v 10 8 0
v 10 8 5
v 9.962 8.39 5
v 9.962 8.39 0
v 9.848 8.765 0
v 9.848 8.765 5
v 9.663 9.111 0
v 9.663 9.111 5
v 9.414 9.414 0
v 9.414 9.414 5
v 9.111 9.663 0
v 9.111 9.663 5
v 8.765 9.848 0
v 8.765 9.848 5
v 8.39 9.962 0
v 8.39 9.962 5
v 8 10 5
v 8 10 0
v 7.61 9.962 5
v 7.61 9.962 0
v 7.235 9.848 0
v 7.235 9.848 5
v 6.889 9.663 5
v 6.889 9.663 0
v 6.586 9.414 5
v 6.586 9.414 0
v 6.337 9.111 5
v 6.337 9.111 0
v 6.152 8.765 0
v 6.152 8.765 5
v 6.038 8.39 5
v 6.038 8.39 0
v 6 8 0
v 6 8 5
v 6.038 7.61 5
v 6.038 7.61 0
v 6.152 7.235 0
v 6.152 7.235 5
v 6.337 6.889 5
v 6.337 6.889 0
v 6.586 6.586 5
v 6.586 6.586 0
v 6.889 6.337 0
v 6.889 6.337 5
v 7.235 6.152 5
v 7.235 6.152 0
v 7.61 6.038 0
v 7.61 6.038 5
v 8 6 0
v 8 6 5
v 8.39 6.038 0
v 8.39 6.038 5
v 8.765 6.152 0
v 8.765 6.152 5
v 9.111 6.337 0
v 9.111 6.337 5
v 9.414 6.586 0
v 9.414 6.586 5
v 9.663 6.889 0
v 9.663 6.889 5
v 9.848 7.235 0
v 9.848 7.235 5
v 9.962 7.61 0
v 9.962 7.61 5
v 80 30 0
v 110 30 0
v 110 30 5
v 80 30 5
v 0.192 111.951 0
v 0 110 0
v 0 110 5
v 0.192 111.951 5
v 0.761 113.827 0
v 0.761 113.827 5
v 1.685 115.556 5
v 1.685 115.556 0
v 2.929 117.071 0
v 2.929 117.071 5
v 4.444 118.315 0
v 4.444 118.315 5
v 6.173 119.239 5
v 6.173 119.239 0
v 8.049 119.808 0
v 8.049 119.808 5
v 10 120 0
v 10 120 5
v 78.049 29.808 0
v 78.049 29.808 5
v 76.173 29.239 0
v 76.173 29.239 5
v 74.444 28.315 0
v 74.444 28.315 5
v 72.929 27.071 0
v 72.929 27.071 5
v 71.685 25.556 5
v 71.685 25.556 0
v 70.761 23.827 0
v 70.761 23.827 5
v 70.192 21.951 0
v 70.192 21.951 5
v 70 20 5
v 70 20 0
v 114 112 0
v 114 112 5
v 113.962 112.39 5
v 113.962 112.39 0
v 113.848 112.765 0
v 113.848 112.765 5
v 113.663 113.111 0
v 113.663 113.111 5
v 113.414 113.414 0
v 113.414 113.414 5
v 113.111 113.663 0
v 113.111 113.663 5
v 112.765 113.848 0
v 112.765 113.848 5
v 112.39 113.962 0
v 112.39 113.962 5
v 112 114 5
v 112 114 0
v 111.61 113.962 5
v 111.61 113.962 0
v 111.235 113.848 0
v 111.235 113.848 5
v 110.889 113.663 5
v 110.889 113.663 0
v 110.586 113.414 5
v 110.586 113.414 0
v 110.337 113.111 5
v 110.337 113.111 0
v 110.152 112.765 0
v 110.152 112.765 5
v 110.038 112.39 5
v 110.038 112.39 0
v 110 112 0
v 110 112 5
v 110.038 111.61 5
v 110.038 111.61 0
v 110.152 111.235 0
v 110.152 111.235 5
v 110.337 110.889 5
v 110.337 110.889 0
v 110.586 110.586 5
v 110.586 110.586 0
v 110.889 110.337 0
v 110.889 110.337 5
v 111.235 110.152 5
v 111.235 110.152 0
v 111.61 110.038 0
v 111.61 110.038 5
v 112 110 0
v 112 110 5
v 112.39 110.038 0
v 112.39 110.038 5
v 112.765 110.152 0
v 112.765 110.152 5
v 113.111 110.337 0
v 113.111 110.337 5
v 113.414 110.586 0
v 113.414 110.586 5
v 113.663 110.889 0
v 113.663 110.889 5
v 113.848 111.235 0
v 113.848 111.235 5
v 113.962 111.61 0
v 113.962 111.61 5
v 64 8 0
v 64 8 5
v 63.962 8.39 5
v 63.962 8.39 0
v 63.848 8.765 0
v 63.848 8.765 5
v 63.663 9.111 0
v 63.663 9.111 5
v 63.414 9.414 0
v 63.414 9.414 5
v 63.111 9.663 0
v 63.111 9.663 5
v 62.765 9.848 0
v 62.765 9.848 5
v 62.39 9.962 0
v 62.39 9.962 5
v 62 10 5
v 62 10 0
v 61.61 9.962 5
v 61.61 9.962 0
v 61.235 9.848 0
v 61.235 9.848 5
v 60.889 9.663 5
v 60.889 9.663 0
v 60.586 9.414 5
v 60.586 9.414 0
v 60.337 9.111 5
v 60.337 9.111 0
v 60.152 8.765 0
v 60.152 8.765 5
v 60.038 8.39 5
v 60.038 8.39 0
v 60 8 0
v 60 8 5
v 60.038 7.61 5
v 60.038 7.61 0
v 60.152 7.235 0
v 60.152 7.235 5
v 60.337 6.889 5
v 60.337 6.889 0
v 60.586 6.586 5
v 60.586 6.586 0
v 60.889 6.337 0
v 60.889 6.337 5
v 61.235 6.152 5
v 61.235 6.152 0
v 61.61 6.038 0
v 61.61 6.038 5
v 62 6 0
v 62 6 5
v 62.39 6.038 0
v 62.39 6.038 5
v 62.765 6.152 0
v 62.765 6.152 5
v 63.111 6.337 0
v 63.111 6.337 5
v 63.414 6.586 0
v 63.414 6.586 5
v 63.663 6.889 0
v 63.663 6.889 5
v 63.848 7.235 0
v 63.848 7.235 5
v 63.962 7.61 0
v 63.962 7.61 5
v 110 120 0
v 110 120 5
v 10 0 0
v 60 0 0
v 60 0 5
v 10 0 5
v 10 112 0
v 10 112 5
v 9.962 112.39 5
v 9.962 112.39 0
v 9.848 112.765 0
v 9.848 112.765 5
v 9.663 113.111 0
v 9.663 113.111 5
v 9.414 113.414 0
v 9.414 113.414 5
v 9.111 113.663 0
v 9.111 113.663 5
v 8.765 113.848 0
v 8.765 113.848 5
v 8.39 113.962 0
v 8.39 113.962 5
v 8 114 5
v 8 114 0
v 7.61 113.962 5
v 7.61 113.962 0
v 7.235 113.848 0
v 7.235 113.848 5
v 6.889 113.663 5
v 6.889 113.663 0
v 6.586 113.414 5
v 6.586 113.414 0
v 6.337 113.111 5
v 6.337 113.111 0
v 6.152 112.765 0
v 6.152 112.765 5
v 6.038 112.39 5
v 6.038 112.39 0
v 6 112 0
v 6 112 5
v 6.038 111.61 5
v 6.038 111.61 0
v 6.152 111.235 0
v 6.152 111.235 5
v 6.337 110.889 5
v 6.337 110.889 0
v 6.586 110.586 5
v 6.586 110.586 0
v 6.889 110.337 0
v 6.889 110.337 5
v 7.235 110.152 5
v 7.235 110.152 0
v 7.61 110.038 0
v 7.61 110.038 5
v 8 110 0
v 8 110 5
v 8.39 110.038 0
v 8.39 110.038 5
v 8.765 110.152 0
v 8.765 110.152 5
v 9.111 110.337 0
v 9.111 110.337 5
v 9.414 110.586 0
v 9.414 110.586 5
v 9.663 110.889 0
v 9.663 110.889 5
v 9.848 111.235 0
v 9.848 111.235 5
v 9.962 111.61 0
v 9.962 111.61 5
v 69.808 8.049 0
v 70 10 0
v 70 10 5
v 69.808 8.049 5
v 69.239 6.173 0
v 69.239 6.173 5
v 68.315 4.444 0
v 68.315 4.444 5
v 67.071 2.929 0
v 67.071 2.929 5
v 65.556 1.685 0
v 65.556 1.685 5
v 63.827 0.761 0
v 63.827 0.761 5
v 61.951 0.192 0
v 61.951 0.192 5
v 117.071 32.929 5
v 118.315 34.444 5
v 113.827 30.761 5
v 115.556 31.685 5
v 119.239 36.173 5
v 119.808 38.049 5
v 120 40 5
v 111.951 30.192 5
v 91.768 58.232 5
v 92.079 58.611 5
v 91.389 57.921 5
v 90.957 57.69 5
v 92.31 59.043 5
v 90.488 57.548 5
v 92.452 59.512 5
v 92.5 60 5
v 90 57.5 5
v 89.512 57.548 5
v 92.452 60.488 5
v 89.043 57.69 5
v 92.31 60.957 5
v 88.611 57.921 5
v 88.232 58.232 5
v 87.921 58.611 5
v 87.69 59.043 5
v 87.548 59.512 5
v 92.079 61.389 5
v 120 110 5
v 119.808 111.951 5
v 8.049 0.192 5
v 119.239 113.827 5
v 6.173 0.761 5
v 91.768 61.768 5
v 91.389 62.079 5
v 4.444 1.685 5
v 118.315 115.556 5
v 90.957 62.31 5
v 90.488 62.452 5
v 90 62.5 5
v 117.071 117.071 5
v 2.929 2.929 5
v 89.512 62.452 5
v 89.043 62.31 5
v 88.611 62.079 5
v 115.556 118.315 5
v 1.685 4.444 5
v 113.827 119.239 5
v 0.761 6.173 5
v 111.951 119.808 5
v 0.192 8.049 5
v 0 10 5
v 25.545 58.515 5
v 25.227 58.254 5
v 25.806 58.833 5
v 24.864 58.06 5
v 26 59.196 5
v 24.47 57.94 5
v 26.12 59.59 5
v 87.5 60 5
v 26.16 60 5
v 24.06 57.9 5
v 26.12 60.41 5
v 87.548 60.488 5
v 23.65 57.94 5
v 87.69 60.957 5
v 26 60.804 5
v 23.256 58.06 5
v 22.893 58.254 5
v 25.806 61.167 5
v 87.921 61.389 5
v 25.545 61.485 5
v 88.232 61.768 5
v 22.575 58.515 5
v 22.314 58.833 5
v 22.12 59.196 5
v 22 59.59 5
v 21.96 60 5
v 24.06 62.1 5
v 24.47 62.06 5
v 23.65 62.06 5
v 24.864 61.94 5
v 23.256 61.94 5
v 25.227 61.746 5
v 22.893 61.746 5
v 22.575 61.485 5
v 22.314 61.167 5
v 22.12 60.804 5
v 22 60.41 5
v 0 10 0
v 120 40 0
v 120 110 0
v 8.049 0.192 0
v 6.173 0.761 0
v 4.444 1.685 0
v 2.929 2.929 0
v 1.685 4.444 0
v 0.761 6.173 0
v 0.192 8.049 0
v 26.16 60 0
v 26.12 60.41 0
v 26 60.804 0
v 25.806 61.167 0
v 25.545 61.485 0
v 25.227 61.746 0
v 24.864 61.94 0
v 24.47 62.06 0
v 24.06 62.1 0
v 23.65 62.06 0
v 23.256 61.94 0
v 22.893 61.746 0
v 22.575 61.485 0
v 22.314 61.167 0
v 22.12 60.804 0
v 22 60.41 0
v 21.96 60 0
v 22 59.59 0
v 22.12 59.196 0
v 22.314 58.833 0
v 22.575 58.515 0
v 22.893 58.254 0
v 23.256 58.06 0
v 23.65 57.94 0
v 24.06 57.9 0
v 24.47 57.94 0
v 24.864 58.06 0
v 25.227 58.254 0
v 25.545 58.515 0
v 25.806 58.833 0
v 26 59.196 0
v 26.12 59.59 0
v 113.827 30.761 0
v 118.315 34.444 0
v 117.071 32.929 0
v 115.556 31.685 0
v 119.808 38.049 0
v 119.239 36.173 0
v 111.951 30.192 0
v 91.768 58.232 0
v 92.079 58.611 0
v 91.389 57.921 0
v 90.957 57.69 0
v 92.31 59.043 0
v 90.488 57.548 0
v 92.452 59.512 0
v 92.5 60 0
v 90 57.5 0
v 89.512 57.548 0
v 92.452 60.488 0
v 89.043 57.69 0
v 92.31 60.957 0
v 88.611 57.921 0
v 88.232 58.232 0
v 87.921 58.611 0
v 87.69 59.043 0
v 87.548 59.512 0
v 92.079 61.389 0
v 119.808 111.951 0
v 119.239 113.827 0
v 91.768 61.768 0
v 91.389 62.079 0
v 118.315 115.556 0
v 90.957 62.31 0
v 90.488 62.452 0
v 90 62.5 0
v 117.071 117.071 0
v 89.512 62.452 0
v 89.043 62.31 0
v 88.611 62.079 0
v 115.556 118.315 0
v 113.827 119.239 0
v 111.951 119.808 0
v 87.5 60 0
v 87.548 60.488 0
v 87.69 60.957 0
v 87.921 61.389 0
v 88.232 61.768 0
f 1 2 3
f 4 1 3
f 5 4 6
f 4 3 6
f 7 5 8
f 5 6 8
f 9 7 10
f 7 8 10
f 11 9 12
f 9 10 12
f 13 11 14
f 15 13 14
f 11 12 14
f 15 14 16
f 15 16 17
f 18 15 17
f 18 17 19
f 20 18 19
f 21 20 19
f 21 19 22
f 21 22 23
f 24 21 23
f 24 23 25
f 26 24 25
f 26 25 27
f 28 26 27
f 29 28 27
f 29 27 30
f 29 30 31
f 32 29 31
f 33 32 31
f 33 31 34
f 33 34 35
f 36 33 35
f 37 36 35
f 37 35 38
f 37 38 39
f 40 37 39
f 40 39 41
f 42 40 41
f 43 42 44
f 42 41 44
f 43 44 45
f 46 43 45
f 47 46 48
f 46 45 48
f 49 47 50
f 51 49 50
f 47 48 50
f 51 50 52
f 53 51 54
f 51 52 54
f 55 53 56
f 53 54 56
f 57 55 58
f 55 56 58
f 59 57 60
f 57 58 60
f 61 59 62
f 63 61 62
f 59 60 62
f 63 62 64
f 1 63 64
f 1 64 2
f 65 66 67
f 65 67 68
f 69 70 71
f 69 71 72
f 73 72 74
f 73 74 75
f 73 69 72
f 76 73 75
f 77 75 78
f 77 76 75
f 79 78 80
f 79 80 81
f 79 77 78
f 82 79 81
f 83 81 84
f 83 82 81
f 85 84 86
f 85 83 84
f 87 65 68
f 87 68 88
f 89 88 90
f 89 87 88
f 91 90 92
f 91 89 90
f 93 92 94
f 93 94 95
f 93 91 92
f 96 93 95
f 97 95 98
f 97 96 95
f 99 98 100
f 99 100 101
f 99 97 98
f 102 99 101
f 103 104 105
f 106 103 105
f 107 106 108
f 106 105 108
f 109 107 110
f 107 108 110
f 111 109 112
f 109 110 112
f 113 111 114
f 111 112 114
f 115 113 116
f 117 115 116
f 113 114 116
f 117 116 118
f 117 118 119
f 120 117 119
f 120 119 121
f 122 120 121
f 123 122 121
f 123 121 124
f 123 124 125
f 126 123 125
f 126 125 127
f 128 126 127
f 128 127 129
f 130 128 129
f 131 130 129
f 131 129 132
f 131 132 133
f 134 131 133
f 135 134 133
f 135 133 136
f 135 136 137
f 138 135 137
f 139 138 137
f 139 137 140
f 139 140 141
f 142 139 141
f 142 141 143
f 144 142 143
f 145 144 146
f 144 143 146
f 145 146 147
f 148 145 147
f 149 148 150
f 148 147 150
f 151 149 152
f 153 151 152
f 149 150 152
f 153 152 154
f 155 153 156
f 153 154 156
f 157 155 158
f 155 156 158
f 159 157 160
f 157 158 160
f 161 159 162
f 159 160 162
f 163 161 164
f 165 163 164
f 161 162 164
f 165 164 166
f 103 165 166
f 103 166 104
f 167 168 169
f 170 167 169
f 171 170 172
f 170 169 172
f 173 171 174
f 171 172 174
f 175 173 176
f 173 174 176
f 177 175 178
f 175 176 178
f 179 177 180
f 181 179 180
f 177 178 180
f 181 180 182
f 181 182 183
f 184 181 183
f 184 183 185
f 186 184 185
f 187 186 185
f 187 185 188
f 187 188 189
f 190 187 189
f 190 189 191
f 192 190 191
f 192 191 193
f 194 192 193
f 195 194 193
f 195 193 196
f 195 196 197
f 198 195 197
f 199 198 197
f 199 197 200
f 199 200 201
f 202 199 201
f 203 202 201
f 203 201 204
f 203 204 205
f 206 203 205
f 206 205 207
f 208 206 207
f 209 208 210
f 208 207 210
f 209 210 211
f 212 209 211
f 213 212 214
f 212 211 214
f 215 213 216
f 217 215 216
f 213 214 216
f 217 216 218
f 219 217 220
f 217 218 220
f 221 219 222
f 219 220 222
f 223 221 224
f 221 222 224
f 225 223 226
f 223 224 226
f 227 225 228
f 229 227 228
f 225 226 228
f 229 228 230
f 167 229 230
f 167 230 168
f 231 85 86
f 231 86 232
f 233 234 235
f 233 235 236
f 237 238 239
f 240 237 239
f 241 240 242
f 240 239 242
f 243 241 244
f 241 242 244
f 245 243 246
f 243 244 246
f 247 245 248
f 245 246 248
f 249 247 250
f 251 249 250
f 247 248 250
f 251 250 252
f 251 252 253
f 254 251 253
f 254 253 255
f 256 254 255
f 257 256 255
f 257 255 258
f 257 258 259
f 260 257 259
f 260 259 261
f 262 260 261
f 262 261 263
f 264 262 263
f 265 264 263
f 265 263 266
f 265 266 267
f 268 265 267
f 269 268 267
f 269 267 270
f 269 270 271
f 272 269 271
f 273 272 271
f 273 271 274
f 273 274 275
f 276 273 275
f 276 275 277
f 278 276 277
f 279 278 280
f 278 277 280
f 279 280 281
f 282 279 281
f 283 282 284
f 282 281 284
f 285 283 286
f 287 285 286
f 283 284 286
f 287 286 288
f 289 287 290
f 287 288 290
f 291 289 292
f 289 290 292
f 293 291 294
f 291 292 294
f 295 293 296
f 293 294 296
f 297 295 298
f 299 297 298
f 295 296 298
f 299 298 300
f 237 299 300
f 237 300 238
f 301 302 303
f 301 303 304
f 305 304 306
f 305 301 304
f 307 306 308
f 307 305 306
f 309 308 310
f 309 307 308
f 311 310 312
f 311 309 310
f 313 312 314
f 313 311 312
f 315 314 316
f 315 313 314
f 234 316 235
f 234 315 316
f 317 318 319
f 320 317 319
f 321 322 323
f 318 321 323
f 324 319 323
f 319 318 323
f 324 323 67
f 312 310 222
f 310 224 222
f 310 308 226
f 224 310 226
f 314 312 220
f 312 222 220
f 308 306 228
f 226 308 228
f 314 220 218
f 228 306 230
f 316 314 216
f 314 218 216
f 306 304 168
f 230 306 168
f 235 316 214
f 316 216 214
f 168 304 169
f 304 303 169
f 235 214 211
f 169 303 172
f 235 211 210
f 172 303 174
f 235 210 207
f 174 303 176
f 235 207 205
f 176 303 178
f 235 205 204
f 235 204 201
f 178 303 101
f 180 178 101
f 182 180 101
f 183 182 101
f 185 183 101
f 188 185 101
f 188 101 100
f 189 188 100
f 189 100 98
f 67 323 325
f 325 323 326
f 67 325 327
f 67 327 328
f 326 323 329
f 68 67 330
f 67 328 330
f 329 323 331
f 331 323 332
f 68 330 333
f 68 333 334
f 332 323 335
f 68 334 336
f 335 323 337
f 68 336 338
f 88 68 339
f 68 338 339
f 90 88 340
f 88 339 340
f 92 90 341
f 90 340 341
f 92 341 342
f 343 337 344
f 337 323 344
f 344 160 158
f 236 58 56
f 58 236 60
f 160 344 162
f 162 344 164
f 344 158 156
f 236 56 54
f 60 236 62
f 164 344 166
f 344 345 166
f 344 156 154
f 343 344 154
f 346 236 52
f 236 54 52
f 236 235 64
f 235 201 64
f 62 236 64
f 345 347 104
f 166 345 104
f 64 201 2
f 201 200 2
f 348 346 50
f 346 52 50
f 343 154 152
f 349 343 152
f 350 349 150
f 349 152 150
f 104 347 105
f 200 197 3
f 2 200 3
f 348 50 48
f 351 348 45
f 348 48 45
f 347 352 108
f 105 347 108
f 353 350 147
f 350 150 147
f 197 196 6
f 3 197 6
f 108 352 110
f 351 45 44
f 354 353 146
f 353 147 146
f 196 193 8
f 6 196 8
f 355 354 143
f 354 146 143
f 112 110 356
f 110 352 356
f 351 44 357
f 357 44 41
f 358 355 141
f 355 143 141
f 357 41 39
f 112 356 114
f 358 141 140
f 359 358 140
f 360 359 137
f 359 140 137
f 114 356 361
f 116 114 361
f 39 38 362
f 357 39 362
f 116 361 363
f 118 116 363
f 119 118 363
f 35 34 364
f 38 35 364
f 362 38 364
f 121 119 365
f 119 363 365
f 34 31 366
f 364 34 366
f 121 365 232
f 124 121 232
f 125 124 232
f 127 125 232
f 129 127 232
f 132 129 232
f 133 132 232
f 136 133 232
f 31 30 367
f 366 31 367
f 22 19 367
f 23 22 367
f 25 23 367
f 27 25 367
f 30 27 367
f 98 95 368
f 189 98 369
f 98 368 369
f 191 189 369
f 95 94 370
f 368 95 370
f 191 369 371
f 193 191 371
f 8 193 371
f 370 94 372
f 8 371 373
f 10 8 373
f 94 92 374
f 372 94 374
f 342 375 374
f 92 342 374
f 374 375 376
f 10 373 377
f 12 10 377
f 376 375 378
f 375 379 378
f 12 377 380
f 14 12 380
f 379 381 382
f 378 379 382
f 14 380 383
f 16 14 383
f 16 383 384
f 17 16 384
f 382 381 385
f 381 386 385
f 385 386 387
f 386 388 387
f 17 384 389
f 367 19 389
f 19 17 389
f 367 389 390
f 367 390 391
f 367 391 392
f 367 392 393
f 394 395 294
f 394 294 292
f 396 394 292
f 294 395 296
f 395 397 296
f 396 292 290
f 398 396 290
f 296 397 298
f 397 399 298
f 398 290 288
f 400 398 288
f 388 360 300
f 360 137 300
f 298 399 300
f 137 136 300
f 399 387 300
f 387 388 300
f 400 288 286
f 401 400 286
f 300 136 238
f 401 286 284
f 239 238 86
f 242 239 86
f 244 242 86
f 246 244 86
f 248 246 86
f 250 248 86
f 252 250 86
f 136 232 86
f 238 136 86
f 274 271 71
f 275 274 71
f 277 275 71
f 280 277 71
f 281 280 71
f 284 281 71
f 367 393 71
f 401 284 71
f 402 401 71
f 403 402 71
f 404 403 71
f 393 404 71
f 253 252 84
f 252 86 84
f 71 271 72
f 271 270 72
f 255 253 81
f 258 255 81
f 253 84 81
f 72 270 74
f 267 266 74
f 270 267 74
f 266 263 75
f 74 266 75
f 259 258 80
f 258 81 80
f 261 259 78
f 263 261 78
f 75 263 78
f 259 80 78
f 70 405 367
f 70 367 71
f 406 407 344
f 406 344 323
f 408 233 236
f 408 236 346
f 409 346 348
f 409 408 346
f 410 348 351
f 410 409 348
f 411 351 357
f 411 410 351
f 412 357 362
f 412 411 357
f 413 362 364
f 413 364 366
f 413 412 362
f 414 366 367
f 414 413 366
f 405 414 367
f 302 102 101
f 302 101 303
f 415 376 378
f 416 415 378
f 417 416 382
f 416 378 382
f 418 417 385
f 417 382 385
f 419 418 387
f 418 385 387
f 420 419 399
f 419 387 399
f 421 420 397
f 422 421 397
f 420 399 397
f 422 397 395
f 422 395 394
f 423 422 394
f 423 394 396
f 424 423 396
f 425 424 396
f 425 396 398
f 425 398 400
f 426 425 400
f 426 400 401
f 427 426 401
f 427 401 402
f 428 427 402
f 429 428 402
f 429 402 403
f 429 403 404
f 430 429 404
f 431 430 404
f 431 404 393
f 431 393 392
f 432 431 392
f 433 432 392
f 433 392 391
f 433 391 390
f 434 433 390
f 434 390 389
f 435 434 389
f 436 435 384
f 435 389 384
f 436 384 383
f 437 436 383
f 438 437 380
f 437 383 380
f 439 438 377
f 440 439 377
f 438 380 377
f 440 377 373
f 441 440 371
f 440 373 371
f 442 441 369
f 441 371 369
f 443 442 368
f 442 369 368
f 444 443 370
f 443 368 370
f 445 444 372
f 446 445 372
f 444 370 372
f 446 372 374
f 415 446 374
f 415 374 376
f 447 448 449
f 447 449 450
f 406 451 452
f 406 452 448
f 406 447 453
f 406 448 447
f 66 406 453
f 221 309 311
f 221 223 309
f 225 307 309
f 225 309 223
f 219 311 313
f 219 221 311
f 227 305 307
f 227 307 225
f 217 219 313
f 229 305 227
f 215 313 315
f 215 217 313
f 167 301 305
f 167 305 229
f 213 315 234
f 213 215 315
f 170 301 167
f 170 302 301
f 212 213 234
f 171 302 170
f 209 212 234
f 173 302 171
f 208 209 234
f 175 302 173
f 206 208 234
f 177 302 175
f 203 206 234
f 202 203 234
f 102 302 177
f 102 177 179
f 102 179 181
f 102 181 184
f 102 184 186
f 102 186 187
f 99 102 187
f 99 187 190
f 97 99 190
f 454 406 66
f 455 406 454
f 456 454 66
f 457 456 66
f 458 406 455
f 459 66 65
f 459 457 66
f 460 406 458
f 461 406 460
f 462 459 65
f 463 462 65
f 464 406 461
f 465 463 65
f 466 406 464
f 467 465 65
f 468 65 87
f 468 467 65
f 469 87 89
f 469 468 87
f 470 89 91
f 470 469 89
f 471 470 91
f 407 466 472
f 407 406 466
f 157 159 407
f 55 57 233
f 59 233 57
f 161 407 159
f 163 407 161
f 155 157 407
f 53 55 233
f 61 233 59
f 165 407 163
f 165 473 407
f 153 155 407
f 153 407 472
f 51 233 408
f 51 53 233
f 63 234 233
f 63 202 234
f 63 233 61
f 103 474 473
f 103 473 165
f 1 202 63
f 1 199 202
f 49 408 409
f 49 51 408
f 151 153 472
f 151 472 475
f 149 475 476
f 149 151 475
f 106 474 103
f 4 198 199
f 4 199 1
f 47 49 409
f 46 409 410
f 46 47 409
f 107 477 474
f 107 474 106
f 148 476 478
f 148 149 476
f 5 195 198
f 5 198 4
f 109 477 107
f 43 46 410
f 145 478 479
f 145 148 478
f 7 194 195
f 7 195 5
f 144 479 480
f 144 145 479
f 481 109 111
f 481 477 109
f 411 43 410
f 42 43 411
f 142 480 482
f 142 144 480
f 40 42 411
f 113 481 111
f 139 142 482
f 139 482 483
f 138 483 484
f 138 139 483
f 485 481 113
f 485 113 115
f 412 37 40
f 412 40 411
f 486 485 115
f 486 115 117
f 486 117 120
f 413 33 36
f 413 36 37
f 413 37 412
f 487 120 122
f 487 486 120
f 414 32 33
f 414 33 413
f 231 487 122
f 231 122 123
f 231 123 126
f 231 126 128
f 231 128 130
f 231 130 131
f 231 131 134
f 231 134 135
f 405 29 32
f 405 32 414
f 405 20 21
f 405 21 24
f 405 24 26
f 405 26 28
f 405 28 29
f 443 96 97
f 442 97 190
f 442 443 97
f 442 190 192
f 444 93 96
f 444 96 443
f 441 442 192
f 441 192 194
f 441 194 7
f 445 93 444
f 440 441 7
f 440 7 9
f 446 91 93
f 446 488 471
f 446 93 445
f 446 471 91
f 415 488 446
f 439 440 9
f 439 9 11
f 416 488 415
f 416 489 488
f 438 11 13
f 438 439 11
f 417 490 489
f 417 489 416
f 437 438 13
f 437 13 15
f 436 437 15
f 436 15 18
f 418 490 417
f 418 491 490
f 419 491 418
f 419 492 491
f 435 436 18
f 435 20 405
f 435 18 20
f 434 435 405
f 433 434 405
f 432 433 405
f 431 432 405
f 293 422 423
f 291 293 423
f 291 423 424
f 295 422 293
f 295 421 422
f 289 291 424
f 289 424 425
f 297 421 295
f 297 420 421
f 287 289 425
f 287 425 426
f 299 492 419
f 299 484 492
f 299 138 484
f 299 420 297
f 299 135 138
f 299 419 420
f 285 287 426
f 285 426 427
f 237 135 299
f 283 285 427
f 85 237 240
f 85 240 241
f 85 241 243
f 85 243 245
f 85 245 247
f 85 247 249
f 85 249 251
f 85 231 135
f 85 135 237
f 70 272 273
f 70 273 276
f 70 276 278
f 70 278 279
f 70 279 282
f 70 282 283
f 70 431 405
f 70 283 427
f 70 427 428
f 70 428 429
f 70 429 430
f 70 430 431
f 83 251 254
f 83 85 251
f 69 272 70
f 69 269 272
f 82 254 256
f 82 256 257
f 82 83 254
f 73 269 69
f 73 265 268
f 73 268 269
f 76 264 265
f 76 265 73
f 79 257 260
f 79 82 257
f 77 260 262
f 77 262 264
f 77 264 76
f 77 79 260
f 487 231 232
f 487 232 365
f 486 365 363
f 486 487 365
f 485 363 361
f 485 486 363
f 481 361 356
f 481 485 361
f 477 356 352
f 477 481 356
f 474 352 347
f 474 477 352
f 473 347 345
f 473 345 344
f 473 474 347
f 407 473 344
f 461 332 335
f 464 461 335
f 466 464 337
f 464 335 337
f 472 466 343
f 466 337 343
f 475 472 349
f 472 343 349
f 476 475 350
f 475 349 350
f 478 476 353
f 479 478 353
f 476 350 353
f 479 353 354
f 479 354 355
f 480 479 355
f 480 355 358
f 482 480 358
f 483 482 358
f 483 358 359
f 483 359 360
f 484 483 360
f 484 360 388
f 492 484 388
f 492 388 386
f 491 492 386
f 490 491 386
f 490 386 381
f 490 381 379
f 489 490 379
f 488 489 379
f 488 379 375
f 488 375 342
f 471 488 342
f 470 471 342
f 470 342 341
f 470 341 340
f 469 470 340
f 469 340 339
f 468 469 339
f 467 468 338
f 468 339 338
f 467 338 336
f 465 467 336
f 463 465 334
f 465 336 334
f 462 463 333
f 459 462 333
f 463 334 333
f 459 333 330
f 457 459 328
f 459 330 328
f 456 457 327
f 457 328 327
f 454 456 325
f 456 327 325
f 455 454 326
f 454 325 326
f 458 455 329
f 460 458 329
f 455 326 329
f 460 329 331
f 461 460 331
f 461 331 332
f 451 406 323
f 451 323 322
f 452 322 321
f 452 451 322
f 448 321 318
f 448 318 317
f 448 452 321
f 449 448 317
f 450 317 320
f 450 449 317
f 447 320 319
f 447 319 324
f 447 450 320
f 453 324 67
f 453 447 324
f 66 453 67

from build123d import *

# Parameters (mm, degrees)
SALIENTE_EXTRUIR1_DEPTH = 5
CROQUIS2_R              = 2
CROQUIS2_R_2            = 2.5
CROQUIS2_R_3            = 2.1
CORTAR_EXTRUIR1_DEPTH   = 10


with BuildPart() as part:
    # Croquis1 → Saliente-Extruir1 (new body)
    with BuildSketch(Plane.XY):
        with BuildLine():
            Line((110, 30), (80, 30))
            ThreePointArc((80, 30), (72.928932188, 27.071067812), (70, 20))
            Line((70, 20), (70, 10))
            ThreePointArc((70, 10), (67.071067812, 2.928932188), (60, 0))
            Line((60, 0), (10, 0))
            ThreePointArc((10, 0), (2.928932188, 2.928932188), (0, 10))
            Line((0, 10), (0, 110))
            ThreePointArc((0, 110), (2.928932188, 117.071067812), (10, 120))
            Line((10, 120), (110, 120))
            ThreePointArc((110, 120), (117.071067812, 117.071067812), (120, 110))
            Line((120, 110), (120, 40))
            ThreePointArc((120, 40), (117.071067812, 32.928932188), (110, 30))
        make_face()
    extrude(amount=SALIENTE_EXTRUIR1_DEPTH)

    # Croquis2 → Cortar-Extruir1 (cut)
    with BuildSketch(Plane.XY.offset(5)):
        with Locations((8, 112)):
            Circle(CROQUIS2_R)
        with Locations((8, 8)):
            Circle(CROQUIS2_R)
        with Locations((112, 8)):
            Circle(CROQUIS2_R)
        with Locations((112, 112)):
            Circle(CROQUIS2_R)
        with Locations((90, 60)):
            Circle(CROQUIS2_R_2)
        with Locations((62, 8)):
            Circle(CROQUIS2_R)
        with Locations((24.06, 60)):
            Circle(CROQUIS2_R_3)
    extrude(amount=-CORTAR_EXTRUIR1_DEPTH, mode=Mode.SUBTRACT)


solid = part.part
